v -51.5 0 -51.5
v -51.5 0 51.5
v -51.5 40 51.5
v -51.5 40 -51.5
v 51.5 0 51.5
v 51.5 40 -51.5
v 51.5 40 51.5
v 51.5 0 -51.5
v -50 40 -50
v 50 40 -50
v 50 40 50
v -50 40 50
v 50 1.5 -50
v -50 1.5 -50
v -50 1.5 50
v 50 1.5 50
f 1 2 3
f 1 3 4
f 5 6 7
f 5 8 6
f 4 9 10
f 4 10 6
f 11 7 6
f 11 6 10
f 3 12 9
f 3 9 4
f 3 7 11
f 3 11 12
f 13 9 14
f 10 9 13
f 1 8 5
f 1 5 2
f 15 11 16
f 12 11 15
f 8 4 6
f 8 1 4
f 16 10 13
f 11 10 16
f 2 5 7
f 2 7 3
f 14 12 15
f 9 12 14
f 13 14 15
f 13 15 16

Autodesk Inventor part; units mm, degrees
ref_plane "YZ Plane" through (0, 0, 0) normal (1, 0, 0) x (0, 1, 0)
ref_plane "XZ Plane" through (0, 0, 0) normal (0, 1, 0) x (-1, 0, 0)
ref_plane "XY Plane" through (0, 0, 0) normal (0, 0, 1) x (1, 0, 0)
sketch "Esboço1" plane through (0, 0, 0) normal (0, 1, 0) x (-1, 0, 0)
  line L0 (-51.5, 51.5) -> (51.5, 51.5)
  line L1 (51.5, 51.5) -> (51.5, -51.5)
  line L2 (51.5, -51.5) -> (-51.5, -51.5)
  line L3 (-51.5, -51.5) -> (-51.5, 51.5)
  line L4 (-51.5, 51.5) -> (51.5, -51.5) construction
  line L5 (51.5, 51.5) -> (-51.5, -51.5) construction
  point P0 (0, 0)
  dimension "d0" = 103
  dimension "d1" = 103
extrude "Extrusão1" add sketch "Esboço1" along normal blind 40
sketch "Esboço2" plane through (0, 40, 0) normal (0, 1, 0) x (1, 0, 0)
  line L0 (51.5, 51.5) -> (-51.5, 51.5) projected
  line L1 (-51.5, 51.5) -> (-51.5, -51.5) projected
  line L2 (-51.5, -51.5) -> (51.5, -51.5) projected
  line L3 (51.5, -51.5) -> (51.5, 51.5) projected
  line L4 (-50, -50) -> (-50, 50)
  line L5 (-50, 50) -> (50, 50)
  line L6 (50, 50) -> (50, -50)
  line L7 (50, -50) -> (-50, -50)
  point P0 (0, 0)
  dimension "d4" = 1.5
extrude "Extrusão2" cut sketch "Esboço2" against normal blind 38.5 contours L4 L5 L6 L7
properties part number "Gabarito" material "Madeira (Cerejeira)"
